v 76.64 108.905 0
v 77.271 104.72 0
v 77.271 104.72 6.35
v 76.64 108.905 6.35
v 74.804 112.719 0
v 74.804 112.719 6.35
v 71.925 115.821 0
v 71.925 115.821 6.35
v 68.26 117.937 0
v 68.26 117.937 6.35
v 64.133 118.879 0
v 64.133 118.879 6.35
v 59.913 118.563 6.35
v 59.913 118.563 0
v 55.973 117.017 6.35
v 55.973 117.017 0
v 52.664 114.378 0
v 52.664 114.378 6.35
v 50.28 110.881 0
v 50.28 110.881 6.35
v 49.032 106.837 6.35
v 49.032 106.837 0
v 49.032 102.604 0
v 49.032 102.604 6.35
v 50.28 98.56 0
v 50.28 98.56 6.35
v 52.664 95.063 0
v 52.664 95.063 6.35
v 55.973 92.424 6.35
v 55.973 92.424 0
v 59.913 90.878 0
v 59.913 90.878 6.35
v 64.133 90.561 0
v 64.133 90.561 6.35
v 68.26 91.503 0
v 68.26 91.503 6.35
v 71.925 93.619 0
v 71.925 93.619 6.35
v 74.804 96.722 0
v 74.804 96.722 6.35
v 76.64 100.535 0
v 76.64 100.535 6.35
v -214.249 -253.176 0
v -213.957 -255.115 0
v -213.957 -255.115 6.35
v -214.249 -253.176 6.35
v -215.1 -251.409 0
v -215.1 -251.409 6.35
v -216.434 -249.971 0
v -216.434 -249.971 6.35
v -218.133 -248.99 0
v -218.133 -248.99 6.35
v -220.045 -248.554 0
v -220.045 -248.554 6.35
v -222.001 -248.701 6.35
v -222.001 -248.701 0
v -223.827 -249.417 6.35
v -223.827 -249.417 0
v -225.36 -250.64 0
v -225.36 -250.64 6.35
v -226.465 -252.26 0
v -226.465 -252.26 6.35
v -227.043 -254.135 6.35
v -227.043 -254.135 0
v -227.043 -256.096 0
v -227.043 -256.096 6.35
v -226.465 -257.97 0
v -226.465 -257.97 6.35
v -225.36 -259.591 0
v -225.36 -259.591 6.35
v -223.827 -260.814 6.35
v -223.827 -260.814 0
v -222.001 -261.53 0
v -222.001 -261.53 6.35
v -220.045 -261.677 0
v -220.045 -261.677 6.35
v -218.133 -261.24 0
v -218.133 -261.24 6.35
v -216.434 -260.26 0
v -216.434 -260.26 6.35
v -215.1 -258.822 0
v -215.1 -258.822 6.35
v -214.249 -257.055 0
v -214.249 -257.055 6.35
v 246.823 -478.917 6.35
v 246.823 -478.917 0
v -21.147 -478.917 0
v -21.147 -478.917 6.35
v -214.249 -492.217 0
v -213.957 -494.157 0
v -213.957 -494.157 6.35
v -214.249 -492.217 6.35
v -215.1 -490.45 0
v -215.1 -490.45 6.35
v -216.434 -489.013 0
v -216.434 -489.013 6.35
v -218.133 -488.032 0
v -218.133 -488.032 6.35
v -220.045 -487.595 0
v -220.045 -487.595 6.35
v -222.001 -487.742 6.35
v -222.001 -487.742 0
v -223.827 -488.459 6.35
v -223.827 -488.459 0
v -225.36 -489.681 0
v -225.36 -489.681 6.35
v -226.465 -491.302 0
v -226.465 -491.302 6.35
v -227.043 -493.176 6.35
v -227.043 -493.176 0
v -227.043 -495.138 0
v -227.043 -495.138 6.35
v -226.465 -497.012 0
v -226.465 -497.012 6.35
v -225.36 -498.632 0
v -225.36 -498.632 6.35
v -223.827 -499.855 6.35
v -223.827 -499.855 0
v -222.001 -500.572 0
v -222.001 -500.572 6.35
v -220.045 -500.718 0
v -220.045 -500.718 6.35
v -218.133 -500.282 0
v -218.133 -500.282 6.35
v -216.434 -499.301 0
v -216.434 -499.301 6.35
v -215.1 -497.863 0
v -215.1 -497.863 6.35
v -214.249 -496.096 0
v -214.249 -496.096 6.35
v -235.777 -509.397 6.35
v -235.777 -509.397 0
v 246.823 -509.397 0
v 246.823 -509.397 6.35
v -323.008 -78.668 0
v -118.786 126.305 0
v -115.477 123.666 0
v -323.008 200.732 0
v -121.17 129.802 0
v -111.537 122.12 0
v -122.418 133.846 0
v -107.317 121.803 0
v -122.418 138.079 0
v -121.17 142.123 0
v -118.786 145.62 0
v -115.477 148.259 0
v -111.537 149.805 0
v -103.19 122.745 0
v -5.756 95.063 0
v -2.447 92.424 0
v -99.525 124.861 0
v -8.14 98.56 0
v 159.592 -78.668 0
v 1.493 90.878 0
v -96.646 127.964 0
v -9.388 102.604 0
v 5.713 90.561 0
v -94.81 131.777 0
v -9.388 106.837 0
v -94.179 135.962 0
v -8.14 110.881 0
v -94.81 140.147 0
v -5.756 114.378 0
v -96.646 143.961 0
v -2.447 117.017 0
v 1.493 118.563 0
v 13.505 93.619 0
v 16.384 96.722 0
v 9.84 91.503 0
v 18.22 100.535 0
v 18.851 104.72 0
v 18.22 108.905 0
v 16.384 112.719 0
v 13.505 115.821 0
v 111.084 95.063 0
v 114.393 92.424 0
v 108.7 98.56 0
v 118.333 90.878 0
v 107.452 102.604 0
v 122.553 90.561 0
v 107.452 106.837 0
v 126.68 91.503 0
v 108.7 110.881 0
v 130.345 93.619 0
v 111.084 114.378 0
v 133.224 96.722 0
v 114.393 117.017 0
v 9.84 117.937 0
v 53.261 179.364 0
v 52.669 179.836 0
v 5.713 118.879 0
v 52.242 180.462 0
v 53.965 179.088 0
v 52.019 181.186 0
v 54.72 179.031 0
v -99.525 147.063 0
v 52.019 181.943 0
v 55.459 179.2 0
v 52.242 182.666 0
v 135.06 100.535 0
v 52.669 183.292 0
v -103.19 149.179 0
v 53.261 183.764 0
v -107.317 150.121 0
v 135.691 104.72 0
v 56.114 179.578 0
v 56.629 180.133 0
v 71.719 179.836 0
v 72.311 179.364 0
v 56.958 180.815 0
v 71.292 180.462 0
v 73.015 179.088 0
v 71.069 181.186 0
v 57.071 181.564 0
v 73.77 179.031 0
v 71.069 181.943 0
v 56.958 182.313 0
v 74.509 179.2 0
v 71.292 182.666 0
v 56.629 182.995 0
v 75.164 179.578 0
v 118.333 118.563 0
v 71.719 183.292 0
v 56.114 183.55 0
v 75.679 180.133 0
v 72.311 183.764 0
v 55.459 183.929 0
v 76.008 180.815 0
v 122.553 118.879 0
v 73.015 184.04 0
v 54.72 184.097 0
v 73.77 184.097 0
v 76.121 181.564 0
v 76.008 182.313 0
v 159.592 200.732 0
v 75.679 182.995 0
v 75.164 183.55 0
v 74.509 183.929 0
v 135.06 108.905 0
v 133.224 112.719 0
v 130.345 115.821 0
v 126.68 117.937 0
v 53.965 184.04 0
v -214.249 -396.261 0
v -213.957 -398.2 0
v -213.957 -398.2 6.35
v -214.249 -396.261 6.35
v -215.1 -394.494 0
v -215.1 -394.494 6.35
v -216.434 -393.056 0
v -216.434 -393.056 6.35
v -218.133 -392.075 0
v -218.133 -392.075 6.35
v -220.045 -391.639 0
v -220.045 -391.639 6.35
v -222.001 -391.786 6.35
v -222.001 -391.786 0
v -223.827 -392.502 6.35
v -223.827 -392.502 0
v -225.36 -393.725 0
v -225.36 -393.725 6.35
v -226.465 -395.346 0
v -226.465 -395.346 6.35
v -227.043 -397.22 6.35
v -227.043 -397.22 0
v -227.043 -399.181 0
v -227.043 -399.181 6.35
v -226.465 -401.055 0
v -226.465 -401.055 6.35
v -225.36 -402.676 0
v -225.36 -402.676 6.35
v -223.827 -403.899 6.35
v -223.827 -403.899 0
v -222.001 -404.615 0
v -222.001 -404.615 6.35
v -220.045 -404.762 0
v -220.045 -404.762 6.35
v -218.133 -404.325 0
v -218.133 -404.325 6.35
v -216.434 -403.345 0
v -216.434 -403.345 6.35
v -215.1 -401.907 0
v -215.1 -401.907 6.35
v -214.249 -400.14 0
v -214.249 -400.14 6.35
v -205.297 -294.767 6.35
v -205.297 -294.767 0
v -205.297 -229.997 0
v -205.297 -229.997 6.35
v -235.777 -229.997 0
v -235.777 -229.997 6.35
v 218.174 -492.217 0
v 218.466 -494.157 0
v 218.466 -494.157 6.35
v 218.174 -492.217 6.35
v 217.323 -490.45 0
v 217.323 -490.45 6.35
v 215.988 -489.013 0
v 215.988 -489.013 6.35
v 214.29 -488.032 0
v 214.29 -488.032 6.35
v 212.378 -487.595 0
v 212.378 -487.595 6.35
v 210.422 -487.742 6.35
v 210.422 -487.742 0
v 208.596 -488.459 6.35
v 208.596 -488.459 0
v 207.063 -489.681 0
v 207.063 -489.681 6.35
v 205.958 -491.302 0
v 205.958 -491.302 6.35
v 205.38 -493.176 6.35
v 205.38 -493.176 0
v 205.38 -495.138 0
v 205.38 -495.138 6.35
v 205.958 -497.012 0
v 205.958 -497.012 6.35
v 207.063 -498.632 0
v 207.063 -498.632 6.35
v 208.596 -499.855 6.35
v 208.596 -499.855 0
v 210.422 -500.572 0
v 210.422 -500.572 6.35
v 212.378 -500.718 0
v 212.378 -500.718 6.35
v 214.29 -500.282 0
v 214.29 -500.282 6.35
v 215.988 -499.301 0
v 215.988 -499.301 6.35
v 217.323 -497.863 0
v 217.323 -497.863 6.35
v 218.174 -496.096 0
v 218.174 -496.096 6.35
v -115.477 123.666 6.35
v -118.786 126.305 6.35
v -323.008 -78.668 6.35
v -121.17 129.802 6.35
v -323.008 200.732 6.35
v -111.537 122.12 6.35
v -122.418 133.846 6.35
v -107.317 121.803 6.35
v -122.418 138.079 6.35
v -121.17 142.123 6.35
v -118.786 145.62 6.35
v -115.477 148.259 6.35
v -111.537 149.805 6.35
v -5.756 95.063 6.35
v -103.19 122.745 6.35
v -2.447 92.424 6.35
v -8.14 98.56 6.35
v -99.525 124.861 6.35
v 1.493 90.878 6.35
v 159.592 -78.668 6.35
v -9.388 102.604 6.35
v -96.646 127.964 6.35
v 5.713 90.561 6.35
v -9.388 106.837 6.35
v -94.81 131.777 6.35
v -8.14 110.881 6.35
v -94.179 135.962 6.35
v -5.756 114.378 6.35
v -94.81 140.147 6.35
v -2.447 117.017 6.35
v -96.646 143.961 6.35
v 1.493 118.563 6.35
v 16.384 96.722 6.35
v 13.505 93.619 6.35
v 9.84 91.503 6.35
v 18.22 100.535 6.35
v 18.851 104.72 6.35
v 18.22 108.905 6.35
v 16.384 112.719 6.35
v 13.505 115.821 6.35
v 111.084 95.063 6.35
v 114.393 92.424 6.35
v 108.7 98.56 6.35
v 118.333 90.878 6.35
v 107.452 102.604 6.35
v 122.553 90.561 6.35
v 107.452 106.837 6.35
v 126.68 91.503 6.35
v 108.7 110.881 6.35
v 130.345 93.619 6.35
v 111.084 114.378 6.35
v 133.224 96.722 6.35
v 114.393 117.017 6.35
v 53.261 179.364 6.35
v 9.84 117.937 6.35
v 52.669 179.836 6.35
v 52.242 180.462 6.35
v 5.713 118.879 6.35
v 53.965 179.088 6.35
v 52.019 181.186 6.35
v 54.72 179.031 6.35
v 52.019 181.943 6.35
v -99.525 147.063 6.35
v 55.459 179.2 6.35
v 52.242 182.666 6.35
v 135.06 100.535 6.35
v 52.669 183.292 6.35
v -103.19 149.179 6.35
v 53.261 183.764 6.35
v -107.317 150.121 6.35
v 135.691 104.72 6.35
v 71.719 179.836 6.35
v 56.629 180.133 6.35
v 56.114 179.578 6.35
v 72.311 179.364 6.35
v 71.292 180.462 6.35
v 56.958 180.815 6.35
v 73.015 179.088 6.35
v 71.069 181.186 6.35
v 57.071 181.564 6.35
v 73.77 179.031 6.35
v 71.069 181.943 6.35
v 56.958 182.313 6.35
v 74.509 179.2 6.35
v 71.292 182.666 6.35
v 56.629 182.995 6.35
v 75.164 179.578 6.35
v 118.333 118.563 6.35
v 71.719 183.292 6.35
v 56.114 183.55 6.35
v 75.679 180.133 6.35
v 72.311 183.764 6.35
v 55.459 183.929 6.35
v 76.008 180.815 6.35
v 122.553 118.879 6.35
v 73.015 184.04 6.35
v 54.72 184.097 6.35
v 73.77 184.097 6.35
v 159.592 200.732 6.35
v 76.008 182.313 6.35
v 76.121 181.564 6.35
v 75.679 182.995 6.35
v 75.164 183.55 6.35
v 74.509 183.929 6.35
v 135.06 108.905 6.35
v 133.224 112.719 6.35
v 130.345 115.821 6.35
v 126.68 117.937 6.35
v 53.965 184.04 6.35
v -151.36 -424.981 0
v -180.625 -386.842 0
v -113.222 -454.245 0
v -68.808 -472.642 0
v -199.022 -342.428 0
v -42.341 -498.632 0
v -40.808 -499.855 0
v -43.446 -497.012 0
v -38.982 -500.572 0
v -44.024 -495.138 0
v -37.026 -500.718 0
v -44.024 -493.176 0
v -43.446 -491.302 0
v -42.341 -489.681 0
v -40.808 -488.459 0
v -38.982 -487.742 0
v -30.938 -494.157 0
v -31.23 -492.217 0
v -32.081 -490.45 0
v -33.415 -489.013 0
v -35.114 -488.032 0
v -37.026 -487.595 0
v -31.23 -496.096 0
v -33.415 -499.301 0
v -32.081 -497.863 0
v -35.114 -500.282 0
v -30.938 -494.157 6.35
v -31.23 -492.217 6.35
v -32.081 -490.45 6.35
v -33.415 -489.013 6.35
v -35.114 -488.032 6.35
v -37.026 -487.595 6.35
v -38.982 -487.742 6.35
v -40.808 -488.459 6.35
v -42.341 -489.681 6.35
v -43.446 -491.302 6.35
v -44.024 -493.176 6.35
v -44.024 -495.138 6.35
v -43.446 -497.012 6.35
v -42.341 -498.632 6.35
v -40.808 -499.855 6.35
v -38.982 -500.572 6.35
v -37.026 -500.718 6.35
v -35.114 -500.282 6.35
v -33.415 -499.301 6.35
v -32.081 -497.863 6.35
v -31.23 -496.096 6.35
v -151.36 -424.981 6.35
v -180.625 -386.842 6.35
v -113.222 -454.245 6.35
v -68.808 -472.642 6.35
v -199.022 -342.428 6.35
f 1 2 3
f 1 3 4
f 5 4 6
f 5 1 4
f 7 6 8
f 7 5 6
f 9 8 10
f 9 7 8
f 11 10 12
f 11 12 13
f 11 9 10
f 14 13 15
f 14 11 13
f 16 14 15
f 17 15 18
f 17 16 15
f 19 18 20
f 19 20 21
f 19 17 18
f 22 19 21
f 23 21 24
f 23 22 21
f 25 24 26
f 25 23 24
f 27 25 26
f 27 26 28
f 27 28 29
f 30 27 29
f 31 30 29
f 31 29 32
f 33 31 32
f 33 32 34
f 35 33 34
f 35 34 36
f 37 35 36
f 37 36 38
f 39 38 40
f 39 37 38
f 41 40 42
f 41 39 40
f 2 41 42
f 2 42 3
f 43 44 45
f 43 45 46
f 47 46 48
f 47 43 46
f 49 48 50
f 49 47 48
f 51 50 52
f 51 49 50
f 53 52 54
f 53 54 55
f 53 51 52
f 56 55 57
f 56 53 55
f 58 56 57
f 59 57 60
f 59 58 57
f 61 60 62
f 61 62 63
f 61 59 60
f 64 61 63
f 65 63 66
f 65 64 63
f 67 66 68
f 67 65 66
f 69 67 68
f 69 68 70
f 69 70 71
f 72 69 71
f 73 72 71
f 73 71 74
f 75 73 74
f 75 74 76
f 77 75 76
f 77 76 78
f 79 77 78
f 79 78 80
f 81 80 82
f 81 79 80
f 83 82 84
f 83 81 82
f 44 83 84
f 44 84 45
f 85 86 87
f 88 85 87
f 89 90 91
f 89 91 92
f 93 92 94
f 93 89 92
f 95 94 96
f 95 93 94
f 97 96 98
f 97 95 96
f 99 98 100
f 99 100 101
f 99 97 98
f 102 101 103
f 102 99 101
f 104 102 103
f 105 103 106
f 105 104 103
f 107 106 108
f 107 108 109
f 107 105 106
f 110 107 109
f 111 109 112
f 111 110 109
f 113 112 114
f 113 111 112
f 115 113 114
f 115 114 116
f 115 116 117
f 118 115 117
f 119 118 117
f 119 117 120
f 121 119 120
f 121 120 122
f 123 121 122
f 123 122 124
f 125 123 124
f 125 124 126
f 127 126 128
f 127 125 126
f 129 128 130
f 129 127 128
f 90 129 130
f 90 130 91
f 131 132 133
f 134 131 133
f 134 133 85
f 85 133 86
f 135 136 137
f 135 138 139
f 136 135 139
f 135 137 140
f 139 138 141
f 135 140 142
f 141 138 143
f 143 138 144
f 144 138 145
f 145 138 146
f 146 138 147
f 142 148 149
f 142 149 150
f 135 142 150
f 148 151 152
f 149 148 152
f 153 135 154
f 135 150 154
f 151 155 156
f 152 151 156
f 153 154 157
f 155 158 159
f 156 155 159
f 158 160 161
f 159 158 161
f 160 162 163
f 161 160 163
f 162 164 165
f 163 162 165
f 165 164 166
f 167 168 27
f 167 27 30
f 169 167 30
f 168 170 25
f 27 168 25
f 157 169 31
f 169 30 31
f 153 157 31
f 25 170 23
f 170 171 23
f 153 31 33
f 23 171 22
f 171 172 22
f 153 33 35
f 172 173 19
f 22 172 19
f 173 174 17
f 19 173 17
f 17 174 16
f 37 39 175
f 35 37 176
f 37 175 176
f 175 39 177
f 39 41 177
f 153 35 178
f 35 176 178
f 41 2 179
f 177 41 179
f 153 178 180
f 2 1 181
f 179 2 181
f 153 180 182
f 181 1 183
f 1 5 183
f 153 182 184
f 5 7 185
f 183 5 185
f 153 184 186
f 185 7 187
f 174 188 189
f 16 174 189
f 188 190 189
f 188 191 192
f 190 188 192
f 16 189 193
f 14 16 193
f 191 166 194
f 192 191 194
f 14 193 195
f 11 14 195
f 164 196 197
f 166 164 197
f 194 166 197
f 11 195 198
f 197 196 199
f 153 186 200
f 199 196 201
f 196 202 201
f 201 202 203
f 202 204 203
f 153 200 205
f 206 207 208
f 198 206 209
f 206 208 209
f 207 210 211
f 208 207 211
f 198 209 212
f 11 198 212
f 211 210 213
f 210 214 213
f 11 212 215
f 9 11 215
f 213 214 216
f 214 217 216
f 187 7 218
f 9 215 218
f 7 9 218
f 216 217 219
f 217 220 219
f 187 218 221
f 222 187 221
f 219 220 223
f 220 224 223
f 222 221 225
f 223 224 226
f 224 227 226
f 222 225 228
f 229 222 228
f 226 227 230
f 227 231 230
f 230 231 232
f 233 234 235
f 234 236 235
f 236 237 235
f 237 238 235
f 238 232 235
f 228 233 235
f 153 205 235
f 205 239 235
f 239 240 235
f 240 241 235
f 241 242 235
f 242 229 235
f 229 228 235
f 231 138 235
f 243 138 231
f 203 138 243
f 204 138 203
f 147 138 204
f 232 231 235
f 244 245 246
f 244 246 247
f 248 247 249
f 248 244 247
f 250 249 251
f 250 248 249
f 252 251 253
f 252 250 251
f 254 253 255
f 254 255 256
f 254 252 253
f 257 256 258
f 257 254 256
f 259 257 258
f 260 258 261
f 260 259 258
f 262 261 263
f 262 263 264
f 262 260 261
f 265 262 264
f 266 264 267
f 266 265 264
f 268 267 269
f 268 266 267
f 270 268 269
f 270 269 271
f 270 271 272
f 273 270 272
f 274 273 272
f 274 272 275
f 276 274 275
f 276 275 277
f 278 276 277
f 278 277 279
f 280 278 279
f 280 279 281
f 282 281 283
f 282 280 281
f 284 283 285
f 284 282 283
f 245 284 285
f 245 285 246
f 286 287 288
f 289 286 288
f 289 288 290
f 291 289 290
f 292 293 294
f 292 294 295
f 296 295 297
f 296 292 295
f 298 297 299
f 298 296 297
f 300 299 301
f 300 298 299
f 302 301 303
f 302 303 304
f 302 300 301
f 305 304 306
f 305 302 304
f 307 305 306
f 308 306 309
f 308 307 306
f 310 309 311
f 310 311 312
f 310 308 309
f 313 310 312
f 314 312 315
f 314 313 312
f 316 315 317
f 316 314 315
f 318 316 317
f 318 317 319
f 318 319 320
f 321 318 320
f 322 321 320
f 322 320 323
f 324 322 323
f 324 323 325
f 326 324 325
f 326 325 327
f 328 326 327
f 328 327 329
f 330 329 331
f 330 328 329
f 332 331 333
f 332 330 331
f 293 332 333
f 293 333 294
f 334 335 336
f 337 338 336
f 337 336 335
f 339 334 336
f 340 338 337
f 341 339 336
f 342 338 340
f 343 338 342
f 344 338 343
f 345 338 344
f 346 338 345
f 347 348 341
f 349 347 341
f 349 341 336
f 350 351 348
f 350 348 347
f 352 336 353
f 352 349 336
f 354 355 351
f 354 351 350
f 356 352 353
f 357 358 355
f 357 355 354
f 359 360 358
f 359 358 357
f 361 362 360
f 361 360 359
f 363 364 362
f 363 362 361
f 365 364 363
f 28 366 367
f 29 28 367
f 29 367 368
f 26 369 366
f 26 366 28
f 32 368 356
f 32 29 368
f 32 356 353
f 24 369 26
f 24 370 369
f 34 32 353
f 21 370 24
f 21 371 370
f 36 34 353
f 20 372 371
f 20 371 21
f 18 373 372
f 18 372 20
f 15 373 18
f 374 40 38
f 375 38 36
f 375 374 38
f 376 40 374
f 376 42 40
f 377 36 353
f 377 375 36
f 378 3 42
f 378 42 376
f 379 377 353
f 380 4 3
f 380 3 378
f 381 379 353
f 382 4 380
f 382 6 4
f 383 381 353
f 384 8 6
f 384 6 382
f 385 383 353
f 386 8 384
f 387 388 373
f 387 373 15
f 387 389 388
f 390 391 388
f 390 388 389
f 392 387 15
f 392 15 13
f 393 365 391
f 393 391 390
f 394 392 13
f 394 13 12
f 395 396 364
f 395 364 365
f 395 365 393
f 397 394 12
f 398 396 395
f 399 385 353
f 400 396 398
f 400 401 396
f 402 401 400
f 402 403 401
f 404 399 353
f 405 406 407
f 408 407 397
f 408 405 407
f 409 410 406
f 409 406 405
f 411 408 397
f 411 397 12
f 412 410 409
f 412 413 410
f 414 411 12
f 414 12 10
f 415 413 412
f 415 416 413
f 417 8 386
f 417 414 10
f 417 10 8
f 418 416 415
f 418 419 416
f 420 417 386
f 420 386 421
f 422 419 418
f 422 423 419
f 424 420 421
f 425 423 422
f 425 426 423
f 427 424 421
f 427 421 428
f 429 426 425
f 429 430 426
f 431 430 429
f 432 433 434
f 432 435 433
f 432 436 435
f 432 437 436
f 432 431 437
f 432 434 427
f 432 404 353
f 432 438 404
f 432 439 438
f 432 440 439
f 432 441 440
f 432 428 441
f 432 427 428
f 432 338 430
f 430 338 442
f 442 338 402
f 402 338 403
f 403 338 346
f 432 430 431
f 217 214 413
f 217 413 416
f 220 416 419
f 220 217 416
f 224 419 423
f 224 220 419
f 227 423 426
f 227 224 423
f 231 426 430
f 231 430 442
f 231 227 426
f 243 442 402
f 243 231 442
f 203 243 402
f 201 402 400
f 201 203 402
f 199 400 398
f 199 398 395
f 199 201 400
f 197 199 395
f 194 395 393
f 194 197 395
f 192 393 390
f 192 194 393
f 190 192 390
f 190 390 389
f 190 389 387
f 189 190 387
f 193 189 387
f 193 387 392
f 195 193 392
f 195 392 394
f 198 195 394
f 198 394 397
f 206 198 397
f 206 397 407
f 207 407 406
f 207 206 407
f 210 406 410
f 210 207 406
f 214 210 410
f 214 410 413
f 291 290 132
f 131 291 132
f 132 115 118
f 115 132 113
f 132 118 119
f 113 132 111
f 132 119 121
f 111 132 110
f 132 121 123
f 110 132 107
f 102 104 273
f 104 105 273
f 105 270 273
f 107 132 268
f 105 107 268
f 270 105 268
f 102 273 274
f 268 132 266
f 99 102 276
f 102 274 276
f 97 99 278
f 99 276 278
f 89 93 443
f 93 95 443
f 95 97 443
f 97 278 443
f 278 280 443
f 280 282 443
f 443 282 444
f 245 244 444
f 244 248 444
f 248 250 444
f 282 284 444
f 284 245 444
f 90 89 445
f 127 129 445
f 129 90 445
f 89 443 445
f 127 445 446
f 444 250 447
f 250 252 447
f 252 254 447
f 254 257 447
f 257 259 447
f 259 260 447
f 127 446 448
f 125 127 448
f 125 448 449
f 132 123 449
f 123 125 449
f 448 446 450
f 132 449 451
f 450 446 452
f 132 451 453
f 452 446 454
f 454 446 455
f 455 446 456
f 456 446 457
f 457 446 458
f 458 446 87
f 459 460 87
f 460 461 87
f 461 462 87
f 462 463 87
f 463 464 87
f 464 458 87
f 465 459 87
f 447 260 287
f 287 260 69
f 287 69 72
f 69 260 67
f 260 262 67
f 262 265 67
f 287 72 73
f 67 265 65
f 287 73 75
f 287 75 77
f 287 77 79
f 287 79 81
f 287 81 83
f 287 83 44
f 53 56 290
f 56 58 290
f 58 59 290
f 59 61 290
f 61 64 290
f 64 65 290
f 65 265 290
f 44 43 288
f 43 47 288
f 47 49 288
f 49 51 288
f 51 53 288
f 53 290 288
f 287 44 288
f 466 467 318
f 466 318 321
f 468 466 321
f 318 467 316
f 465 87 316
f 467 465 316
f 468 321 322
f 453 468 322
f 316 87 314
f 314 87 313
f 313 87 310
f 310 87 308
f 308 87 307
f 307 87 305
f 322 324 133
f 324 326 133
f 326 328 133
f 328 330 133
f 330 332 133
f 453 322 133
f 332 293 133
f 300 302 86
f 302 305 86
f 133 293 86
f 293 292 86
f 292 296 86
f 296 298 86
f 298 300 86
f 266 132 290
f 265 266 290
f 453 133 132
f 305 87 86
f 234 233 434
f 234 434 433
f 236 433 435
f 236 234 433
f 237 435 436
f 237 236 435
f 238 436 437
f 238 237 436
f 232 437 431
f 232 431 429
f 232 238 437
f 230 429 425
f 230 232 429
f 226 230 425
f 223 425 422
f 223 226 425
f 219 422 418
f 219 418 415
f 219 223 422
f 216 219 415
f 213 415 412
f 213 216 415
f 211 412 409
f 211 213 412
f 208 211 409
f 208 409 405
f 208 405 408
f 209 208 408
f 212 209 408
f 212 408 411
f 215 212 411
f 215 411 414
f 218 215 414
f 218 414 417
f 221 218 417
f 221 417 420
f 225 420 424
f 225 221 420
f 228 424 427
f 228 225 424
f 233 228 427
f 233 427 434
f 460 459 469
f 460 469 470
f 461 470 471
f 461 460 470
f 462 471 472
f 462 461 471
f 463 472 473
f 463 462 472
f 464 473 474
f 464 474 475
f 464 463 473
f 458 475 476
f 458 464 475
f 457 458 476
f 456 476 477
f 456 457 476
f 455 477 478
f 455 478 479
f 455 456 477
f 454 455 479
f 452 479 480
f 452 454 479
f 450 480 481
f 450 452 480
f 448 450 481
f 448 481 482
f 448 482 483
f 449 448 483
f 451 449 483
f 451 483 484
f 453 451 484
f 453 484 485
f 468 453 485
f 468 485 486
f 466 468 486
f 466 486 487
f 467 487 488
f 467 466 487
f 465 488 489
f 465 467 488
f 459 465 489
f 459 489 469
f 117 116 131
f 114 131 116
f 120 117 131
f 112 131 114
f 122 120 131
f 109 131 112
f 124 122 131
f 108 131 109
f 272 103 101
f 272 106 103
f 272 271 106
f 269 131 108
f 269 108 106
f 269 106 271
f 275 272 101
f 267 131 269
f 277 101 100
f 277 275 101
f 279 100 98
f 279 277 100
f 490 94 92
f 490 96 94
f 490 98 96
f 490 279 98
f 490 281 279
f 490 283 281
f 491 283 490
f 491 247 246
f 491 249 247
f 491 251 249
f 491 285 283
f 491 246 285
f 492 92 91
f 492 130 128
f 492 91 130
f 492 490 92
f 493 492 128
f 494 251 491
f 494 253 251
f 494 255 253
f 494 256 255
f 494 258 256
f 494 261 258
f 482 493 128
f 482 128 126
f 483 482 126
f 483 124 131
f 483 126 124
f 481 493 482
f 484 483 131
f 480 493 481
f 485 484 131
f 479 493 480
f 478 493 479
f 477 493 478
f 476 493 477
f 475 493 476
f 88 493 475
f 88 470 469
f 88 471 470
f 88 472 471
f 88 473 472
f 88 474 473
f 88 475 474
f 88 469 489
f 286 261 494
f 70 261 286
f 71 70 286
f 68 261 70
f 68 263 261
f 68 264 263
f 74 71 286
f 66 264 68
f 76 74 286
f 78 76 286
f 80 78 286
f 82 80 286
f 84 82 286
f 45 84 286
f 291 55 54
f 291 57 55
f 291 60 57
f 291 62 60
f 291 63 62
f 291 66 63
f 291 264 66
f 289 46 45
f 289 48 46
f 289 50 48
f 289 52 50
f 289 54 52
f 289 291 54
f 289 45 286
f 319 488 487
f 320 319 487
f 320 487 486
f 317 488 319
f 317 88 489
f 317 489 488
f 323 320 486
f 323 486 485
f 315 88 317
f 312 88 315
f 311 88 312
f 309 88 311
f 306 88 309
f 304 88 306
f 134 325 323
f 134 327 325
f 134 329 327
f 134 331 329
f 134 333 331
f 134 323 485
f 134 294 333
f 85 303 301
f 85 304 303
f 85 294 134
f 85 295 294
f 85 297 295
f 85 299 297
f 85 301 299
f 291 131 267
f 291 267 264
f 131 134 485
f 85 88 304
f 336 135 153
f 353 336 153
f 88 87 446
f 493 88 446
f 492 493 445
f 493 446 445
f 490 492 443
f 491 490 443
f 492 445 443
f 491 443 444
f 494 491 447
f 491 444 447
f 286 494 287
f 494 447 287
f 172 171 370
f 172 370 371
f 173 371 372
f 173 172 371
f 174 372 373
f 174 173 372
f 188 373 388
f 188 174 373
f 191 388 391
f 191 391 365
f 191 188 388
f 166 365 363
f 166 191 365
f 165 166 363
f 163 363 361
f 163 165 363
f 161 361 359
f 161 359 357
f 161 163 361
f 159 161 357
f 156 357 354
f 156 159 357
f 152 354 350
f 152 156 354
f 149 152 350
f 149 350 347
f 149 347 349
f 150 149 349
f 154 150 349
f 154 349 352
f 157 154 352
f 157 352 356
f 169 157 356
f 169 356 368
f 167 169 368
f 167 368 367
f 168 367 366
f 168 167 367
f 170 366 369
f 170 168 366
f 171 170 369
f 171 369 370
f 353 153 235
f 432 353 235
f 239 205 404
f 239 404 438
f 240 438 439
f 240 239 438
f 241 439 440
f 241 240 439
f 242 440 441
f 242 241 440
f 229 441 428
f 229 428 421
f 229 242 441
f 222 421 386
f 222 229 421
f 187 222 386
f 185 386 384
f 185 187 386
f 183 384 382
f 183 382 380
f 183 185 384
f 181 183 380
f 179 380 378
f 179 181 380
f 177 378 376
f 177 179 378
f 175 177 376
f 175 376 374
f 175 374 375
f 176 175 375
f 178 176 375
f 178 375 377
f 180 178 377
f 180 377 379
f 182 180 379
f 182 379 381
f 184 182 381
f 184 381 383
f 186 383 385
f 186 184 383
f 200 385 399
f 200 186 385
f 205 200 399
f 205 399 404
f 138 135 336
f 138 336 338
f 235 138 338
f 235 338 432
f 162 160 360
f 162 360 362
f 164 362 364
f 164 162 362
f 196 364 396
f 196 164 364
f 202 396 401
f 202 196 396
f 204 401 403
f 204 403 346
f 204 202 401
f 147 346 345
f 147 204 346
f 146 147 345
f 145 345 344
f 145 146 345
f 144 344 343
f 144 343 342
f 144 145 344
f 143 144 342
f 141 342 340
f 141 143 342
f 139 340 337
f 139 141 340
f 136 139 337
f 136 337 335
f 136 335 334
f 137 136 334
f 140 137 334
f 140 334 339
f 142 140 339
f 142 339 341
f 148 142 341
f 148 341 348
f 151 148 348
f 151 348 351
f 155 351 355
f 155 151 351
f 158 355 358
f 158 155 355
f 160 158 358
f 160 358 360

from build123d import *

# Parameters (mm, degrees)
F0_R     = 6.57983
F1_DEPTH = 6.35
F0_W     = 482.6
F0_H     = 279.4
F0_R_2   = 14.1986
F0_R_3   = 2.54
F2_DEPTH = 6.35


with BuildPart() as f1:
    # F0 (on Top) → F1 (new body)
    with BuildSketch(Plane.XY):
        with BuildLine():
            Line((-235.77665, -229.996868), (-235.77665, -509.396868))
            Line((-235.77665, -509.396868), (246.82335, -509.396868))
            Line((246.82335, -509.396868), (246.82335, -478.916868))
            Line((246.82335, -478.916868), (-21.14665, -478.916868))
            ThreePointArc((-21.14665, -478.916868), (-151.360364, -424.980581), (-205.29665, -294.766868))
            Line((-205.29665, -294.766868), (-205.29665, -229.996868))
            Line((-205.29665, -229.996868), (-235.77665, -229.996868))
        make_face()
        with Locations((-220.53665, -494.156868)):
            Circle(F0_R, mode=Mode.SUBTRACT)
        with Locations((-220.53665, -398.200452)):
            Circle(F0_R, mode=Mode.SUBTRACT)
        with Locations((-220.53665, -255.11536)):
            Circle(F0_R, mode=Mode.SUBTRACT)
        with Locations((-37.517611, -494.156868)):
            Circle(F0_R, mode=Mode.SUBTRACT)
        with Locations((211.886004, -494.156868)):
            Circle(F0_R, mode=Mode.SUBTRACT)
    extrude(amount=F1_DEPTH)


with BuildPart() as f2:
    # F0 (on Top) → F2 (new body)
    with BuildSketch(Plane.XY):
        with Locations((-81.707698, 61.032355)):
            Rectangle(F0_W, F0_H)
        with Locations((-108.377698, 135.962355)):
            Circle(F0_R_2, mode=Mode.SUBTRACT)
        with Locations((4.652302, 104.720355)):
            Circle(F0_R_2, mode=Mode.SUBTRACT)
        with Locations((63.072302, 104.720355)):
            Circle(F0_R_2, mode=Mode.SUBTRACT)
        with Locations((54.530641, 181.564134)):
            Circle(F0_R_3, mode=Mode.SUBTRACT)
        with Locations((73.580641, 181.564134)):
            Circle(F0_R_3, mode=Mode.SUBTRACT)
        with Locations((121.492302, 104.720355)):
            Circle(F0_R_2, mode=Mode.SUBTRACT)
    extrude(amount=F2_DEPTH)


solid = Compound([f1.part, f2.part])
